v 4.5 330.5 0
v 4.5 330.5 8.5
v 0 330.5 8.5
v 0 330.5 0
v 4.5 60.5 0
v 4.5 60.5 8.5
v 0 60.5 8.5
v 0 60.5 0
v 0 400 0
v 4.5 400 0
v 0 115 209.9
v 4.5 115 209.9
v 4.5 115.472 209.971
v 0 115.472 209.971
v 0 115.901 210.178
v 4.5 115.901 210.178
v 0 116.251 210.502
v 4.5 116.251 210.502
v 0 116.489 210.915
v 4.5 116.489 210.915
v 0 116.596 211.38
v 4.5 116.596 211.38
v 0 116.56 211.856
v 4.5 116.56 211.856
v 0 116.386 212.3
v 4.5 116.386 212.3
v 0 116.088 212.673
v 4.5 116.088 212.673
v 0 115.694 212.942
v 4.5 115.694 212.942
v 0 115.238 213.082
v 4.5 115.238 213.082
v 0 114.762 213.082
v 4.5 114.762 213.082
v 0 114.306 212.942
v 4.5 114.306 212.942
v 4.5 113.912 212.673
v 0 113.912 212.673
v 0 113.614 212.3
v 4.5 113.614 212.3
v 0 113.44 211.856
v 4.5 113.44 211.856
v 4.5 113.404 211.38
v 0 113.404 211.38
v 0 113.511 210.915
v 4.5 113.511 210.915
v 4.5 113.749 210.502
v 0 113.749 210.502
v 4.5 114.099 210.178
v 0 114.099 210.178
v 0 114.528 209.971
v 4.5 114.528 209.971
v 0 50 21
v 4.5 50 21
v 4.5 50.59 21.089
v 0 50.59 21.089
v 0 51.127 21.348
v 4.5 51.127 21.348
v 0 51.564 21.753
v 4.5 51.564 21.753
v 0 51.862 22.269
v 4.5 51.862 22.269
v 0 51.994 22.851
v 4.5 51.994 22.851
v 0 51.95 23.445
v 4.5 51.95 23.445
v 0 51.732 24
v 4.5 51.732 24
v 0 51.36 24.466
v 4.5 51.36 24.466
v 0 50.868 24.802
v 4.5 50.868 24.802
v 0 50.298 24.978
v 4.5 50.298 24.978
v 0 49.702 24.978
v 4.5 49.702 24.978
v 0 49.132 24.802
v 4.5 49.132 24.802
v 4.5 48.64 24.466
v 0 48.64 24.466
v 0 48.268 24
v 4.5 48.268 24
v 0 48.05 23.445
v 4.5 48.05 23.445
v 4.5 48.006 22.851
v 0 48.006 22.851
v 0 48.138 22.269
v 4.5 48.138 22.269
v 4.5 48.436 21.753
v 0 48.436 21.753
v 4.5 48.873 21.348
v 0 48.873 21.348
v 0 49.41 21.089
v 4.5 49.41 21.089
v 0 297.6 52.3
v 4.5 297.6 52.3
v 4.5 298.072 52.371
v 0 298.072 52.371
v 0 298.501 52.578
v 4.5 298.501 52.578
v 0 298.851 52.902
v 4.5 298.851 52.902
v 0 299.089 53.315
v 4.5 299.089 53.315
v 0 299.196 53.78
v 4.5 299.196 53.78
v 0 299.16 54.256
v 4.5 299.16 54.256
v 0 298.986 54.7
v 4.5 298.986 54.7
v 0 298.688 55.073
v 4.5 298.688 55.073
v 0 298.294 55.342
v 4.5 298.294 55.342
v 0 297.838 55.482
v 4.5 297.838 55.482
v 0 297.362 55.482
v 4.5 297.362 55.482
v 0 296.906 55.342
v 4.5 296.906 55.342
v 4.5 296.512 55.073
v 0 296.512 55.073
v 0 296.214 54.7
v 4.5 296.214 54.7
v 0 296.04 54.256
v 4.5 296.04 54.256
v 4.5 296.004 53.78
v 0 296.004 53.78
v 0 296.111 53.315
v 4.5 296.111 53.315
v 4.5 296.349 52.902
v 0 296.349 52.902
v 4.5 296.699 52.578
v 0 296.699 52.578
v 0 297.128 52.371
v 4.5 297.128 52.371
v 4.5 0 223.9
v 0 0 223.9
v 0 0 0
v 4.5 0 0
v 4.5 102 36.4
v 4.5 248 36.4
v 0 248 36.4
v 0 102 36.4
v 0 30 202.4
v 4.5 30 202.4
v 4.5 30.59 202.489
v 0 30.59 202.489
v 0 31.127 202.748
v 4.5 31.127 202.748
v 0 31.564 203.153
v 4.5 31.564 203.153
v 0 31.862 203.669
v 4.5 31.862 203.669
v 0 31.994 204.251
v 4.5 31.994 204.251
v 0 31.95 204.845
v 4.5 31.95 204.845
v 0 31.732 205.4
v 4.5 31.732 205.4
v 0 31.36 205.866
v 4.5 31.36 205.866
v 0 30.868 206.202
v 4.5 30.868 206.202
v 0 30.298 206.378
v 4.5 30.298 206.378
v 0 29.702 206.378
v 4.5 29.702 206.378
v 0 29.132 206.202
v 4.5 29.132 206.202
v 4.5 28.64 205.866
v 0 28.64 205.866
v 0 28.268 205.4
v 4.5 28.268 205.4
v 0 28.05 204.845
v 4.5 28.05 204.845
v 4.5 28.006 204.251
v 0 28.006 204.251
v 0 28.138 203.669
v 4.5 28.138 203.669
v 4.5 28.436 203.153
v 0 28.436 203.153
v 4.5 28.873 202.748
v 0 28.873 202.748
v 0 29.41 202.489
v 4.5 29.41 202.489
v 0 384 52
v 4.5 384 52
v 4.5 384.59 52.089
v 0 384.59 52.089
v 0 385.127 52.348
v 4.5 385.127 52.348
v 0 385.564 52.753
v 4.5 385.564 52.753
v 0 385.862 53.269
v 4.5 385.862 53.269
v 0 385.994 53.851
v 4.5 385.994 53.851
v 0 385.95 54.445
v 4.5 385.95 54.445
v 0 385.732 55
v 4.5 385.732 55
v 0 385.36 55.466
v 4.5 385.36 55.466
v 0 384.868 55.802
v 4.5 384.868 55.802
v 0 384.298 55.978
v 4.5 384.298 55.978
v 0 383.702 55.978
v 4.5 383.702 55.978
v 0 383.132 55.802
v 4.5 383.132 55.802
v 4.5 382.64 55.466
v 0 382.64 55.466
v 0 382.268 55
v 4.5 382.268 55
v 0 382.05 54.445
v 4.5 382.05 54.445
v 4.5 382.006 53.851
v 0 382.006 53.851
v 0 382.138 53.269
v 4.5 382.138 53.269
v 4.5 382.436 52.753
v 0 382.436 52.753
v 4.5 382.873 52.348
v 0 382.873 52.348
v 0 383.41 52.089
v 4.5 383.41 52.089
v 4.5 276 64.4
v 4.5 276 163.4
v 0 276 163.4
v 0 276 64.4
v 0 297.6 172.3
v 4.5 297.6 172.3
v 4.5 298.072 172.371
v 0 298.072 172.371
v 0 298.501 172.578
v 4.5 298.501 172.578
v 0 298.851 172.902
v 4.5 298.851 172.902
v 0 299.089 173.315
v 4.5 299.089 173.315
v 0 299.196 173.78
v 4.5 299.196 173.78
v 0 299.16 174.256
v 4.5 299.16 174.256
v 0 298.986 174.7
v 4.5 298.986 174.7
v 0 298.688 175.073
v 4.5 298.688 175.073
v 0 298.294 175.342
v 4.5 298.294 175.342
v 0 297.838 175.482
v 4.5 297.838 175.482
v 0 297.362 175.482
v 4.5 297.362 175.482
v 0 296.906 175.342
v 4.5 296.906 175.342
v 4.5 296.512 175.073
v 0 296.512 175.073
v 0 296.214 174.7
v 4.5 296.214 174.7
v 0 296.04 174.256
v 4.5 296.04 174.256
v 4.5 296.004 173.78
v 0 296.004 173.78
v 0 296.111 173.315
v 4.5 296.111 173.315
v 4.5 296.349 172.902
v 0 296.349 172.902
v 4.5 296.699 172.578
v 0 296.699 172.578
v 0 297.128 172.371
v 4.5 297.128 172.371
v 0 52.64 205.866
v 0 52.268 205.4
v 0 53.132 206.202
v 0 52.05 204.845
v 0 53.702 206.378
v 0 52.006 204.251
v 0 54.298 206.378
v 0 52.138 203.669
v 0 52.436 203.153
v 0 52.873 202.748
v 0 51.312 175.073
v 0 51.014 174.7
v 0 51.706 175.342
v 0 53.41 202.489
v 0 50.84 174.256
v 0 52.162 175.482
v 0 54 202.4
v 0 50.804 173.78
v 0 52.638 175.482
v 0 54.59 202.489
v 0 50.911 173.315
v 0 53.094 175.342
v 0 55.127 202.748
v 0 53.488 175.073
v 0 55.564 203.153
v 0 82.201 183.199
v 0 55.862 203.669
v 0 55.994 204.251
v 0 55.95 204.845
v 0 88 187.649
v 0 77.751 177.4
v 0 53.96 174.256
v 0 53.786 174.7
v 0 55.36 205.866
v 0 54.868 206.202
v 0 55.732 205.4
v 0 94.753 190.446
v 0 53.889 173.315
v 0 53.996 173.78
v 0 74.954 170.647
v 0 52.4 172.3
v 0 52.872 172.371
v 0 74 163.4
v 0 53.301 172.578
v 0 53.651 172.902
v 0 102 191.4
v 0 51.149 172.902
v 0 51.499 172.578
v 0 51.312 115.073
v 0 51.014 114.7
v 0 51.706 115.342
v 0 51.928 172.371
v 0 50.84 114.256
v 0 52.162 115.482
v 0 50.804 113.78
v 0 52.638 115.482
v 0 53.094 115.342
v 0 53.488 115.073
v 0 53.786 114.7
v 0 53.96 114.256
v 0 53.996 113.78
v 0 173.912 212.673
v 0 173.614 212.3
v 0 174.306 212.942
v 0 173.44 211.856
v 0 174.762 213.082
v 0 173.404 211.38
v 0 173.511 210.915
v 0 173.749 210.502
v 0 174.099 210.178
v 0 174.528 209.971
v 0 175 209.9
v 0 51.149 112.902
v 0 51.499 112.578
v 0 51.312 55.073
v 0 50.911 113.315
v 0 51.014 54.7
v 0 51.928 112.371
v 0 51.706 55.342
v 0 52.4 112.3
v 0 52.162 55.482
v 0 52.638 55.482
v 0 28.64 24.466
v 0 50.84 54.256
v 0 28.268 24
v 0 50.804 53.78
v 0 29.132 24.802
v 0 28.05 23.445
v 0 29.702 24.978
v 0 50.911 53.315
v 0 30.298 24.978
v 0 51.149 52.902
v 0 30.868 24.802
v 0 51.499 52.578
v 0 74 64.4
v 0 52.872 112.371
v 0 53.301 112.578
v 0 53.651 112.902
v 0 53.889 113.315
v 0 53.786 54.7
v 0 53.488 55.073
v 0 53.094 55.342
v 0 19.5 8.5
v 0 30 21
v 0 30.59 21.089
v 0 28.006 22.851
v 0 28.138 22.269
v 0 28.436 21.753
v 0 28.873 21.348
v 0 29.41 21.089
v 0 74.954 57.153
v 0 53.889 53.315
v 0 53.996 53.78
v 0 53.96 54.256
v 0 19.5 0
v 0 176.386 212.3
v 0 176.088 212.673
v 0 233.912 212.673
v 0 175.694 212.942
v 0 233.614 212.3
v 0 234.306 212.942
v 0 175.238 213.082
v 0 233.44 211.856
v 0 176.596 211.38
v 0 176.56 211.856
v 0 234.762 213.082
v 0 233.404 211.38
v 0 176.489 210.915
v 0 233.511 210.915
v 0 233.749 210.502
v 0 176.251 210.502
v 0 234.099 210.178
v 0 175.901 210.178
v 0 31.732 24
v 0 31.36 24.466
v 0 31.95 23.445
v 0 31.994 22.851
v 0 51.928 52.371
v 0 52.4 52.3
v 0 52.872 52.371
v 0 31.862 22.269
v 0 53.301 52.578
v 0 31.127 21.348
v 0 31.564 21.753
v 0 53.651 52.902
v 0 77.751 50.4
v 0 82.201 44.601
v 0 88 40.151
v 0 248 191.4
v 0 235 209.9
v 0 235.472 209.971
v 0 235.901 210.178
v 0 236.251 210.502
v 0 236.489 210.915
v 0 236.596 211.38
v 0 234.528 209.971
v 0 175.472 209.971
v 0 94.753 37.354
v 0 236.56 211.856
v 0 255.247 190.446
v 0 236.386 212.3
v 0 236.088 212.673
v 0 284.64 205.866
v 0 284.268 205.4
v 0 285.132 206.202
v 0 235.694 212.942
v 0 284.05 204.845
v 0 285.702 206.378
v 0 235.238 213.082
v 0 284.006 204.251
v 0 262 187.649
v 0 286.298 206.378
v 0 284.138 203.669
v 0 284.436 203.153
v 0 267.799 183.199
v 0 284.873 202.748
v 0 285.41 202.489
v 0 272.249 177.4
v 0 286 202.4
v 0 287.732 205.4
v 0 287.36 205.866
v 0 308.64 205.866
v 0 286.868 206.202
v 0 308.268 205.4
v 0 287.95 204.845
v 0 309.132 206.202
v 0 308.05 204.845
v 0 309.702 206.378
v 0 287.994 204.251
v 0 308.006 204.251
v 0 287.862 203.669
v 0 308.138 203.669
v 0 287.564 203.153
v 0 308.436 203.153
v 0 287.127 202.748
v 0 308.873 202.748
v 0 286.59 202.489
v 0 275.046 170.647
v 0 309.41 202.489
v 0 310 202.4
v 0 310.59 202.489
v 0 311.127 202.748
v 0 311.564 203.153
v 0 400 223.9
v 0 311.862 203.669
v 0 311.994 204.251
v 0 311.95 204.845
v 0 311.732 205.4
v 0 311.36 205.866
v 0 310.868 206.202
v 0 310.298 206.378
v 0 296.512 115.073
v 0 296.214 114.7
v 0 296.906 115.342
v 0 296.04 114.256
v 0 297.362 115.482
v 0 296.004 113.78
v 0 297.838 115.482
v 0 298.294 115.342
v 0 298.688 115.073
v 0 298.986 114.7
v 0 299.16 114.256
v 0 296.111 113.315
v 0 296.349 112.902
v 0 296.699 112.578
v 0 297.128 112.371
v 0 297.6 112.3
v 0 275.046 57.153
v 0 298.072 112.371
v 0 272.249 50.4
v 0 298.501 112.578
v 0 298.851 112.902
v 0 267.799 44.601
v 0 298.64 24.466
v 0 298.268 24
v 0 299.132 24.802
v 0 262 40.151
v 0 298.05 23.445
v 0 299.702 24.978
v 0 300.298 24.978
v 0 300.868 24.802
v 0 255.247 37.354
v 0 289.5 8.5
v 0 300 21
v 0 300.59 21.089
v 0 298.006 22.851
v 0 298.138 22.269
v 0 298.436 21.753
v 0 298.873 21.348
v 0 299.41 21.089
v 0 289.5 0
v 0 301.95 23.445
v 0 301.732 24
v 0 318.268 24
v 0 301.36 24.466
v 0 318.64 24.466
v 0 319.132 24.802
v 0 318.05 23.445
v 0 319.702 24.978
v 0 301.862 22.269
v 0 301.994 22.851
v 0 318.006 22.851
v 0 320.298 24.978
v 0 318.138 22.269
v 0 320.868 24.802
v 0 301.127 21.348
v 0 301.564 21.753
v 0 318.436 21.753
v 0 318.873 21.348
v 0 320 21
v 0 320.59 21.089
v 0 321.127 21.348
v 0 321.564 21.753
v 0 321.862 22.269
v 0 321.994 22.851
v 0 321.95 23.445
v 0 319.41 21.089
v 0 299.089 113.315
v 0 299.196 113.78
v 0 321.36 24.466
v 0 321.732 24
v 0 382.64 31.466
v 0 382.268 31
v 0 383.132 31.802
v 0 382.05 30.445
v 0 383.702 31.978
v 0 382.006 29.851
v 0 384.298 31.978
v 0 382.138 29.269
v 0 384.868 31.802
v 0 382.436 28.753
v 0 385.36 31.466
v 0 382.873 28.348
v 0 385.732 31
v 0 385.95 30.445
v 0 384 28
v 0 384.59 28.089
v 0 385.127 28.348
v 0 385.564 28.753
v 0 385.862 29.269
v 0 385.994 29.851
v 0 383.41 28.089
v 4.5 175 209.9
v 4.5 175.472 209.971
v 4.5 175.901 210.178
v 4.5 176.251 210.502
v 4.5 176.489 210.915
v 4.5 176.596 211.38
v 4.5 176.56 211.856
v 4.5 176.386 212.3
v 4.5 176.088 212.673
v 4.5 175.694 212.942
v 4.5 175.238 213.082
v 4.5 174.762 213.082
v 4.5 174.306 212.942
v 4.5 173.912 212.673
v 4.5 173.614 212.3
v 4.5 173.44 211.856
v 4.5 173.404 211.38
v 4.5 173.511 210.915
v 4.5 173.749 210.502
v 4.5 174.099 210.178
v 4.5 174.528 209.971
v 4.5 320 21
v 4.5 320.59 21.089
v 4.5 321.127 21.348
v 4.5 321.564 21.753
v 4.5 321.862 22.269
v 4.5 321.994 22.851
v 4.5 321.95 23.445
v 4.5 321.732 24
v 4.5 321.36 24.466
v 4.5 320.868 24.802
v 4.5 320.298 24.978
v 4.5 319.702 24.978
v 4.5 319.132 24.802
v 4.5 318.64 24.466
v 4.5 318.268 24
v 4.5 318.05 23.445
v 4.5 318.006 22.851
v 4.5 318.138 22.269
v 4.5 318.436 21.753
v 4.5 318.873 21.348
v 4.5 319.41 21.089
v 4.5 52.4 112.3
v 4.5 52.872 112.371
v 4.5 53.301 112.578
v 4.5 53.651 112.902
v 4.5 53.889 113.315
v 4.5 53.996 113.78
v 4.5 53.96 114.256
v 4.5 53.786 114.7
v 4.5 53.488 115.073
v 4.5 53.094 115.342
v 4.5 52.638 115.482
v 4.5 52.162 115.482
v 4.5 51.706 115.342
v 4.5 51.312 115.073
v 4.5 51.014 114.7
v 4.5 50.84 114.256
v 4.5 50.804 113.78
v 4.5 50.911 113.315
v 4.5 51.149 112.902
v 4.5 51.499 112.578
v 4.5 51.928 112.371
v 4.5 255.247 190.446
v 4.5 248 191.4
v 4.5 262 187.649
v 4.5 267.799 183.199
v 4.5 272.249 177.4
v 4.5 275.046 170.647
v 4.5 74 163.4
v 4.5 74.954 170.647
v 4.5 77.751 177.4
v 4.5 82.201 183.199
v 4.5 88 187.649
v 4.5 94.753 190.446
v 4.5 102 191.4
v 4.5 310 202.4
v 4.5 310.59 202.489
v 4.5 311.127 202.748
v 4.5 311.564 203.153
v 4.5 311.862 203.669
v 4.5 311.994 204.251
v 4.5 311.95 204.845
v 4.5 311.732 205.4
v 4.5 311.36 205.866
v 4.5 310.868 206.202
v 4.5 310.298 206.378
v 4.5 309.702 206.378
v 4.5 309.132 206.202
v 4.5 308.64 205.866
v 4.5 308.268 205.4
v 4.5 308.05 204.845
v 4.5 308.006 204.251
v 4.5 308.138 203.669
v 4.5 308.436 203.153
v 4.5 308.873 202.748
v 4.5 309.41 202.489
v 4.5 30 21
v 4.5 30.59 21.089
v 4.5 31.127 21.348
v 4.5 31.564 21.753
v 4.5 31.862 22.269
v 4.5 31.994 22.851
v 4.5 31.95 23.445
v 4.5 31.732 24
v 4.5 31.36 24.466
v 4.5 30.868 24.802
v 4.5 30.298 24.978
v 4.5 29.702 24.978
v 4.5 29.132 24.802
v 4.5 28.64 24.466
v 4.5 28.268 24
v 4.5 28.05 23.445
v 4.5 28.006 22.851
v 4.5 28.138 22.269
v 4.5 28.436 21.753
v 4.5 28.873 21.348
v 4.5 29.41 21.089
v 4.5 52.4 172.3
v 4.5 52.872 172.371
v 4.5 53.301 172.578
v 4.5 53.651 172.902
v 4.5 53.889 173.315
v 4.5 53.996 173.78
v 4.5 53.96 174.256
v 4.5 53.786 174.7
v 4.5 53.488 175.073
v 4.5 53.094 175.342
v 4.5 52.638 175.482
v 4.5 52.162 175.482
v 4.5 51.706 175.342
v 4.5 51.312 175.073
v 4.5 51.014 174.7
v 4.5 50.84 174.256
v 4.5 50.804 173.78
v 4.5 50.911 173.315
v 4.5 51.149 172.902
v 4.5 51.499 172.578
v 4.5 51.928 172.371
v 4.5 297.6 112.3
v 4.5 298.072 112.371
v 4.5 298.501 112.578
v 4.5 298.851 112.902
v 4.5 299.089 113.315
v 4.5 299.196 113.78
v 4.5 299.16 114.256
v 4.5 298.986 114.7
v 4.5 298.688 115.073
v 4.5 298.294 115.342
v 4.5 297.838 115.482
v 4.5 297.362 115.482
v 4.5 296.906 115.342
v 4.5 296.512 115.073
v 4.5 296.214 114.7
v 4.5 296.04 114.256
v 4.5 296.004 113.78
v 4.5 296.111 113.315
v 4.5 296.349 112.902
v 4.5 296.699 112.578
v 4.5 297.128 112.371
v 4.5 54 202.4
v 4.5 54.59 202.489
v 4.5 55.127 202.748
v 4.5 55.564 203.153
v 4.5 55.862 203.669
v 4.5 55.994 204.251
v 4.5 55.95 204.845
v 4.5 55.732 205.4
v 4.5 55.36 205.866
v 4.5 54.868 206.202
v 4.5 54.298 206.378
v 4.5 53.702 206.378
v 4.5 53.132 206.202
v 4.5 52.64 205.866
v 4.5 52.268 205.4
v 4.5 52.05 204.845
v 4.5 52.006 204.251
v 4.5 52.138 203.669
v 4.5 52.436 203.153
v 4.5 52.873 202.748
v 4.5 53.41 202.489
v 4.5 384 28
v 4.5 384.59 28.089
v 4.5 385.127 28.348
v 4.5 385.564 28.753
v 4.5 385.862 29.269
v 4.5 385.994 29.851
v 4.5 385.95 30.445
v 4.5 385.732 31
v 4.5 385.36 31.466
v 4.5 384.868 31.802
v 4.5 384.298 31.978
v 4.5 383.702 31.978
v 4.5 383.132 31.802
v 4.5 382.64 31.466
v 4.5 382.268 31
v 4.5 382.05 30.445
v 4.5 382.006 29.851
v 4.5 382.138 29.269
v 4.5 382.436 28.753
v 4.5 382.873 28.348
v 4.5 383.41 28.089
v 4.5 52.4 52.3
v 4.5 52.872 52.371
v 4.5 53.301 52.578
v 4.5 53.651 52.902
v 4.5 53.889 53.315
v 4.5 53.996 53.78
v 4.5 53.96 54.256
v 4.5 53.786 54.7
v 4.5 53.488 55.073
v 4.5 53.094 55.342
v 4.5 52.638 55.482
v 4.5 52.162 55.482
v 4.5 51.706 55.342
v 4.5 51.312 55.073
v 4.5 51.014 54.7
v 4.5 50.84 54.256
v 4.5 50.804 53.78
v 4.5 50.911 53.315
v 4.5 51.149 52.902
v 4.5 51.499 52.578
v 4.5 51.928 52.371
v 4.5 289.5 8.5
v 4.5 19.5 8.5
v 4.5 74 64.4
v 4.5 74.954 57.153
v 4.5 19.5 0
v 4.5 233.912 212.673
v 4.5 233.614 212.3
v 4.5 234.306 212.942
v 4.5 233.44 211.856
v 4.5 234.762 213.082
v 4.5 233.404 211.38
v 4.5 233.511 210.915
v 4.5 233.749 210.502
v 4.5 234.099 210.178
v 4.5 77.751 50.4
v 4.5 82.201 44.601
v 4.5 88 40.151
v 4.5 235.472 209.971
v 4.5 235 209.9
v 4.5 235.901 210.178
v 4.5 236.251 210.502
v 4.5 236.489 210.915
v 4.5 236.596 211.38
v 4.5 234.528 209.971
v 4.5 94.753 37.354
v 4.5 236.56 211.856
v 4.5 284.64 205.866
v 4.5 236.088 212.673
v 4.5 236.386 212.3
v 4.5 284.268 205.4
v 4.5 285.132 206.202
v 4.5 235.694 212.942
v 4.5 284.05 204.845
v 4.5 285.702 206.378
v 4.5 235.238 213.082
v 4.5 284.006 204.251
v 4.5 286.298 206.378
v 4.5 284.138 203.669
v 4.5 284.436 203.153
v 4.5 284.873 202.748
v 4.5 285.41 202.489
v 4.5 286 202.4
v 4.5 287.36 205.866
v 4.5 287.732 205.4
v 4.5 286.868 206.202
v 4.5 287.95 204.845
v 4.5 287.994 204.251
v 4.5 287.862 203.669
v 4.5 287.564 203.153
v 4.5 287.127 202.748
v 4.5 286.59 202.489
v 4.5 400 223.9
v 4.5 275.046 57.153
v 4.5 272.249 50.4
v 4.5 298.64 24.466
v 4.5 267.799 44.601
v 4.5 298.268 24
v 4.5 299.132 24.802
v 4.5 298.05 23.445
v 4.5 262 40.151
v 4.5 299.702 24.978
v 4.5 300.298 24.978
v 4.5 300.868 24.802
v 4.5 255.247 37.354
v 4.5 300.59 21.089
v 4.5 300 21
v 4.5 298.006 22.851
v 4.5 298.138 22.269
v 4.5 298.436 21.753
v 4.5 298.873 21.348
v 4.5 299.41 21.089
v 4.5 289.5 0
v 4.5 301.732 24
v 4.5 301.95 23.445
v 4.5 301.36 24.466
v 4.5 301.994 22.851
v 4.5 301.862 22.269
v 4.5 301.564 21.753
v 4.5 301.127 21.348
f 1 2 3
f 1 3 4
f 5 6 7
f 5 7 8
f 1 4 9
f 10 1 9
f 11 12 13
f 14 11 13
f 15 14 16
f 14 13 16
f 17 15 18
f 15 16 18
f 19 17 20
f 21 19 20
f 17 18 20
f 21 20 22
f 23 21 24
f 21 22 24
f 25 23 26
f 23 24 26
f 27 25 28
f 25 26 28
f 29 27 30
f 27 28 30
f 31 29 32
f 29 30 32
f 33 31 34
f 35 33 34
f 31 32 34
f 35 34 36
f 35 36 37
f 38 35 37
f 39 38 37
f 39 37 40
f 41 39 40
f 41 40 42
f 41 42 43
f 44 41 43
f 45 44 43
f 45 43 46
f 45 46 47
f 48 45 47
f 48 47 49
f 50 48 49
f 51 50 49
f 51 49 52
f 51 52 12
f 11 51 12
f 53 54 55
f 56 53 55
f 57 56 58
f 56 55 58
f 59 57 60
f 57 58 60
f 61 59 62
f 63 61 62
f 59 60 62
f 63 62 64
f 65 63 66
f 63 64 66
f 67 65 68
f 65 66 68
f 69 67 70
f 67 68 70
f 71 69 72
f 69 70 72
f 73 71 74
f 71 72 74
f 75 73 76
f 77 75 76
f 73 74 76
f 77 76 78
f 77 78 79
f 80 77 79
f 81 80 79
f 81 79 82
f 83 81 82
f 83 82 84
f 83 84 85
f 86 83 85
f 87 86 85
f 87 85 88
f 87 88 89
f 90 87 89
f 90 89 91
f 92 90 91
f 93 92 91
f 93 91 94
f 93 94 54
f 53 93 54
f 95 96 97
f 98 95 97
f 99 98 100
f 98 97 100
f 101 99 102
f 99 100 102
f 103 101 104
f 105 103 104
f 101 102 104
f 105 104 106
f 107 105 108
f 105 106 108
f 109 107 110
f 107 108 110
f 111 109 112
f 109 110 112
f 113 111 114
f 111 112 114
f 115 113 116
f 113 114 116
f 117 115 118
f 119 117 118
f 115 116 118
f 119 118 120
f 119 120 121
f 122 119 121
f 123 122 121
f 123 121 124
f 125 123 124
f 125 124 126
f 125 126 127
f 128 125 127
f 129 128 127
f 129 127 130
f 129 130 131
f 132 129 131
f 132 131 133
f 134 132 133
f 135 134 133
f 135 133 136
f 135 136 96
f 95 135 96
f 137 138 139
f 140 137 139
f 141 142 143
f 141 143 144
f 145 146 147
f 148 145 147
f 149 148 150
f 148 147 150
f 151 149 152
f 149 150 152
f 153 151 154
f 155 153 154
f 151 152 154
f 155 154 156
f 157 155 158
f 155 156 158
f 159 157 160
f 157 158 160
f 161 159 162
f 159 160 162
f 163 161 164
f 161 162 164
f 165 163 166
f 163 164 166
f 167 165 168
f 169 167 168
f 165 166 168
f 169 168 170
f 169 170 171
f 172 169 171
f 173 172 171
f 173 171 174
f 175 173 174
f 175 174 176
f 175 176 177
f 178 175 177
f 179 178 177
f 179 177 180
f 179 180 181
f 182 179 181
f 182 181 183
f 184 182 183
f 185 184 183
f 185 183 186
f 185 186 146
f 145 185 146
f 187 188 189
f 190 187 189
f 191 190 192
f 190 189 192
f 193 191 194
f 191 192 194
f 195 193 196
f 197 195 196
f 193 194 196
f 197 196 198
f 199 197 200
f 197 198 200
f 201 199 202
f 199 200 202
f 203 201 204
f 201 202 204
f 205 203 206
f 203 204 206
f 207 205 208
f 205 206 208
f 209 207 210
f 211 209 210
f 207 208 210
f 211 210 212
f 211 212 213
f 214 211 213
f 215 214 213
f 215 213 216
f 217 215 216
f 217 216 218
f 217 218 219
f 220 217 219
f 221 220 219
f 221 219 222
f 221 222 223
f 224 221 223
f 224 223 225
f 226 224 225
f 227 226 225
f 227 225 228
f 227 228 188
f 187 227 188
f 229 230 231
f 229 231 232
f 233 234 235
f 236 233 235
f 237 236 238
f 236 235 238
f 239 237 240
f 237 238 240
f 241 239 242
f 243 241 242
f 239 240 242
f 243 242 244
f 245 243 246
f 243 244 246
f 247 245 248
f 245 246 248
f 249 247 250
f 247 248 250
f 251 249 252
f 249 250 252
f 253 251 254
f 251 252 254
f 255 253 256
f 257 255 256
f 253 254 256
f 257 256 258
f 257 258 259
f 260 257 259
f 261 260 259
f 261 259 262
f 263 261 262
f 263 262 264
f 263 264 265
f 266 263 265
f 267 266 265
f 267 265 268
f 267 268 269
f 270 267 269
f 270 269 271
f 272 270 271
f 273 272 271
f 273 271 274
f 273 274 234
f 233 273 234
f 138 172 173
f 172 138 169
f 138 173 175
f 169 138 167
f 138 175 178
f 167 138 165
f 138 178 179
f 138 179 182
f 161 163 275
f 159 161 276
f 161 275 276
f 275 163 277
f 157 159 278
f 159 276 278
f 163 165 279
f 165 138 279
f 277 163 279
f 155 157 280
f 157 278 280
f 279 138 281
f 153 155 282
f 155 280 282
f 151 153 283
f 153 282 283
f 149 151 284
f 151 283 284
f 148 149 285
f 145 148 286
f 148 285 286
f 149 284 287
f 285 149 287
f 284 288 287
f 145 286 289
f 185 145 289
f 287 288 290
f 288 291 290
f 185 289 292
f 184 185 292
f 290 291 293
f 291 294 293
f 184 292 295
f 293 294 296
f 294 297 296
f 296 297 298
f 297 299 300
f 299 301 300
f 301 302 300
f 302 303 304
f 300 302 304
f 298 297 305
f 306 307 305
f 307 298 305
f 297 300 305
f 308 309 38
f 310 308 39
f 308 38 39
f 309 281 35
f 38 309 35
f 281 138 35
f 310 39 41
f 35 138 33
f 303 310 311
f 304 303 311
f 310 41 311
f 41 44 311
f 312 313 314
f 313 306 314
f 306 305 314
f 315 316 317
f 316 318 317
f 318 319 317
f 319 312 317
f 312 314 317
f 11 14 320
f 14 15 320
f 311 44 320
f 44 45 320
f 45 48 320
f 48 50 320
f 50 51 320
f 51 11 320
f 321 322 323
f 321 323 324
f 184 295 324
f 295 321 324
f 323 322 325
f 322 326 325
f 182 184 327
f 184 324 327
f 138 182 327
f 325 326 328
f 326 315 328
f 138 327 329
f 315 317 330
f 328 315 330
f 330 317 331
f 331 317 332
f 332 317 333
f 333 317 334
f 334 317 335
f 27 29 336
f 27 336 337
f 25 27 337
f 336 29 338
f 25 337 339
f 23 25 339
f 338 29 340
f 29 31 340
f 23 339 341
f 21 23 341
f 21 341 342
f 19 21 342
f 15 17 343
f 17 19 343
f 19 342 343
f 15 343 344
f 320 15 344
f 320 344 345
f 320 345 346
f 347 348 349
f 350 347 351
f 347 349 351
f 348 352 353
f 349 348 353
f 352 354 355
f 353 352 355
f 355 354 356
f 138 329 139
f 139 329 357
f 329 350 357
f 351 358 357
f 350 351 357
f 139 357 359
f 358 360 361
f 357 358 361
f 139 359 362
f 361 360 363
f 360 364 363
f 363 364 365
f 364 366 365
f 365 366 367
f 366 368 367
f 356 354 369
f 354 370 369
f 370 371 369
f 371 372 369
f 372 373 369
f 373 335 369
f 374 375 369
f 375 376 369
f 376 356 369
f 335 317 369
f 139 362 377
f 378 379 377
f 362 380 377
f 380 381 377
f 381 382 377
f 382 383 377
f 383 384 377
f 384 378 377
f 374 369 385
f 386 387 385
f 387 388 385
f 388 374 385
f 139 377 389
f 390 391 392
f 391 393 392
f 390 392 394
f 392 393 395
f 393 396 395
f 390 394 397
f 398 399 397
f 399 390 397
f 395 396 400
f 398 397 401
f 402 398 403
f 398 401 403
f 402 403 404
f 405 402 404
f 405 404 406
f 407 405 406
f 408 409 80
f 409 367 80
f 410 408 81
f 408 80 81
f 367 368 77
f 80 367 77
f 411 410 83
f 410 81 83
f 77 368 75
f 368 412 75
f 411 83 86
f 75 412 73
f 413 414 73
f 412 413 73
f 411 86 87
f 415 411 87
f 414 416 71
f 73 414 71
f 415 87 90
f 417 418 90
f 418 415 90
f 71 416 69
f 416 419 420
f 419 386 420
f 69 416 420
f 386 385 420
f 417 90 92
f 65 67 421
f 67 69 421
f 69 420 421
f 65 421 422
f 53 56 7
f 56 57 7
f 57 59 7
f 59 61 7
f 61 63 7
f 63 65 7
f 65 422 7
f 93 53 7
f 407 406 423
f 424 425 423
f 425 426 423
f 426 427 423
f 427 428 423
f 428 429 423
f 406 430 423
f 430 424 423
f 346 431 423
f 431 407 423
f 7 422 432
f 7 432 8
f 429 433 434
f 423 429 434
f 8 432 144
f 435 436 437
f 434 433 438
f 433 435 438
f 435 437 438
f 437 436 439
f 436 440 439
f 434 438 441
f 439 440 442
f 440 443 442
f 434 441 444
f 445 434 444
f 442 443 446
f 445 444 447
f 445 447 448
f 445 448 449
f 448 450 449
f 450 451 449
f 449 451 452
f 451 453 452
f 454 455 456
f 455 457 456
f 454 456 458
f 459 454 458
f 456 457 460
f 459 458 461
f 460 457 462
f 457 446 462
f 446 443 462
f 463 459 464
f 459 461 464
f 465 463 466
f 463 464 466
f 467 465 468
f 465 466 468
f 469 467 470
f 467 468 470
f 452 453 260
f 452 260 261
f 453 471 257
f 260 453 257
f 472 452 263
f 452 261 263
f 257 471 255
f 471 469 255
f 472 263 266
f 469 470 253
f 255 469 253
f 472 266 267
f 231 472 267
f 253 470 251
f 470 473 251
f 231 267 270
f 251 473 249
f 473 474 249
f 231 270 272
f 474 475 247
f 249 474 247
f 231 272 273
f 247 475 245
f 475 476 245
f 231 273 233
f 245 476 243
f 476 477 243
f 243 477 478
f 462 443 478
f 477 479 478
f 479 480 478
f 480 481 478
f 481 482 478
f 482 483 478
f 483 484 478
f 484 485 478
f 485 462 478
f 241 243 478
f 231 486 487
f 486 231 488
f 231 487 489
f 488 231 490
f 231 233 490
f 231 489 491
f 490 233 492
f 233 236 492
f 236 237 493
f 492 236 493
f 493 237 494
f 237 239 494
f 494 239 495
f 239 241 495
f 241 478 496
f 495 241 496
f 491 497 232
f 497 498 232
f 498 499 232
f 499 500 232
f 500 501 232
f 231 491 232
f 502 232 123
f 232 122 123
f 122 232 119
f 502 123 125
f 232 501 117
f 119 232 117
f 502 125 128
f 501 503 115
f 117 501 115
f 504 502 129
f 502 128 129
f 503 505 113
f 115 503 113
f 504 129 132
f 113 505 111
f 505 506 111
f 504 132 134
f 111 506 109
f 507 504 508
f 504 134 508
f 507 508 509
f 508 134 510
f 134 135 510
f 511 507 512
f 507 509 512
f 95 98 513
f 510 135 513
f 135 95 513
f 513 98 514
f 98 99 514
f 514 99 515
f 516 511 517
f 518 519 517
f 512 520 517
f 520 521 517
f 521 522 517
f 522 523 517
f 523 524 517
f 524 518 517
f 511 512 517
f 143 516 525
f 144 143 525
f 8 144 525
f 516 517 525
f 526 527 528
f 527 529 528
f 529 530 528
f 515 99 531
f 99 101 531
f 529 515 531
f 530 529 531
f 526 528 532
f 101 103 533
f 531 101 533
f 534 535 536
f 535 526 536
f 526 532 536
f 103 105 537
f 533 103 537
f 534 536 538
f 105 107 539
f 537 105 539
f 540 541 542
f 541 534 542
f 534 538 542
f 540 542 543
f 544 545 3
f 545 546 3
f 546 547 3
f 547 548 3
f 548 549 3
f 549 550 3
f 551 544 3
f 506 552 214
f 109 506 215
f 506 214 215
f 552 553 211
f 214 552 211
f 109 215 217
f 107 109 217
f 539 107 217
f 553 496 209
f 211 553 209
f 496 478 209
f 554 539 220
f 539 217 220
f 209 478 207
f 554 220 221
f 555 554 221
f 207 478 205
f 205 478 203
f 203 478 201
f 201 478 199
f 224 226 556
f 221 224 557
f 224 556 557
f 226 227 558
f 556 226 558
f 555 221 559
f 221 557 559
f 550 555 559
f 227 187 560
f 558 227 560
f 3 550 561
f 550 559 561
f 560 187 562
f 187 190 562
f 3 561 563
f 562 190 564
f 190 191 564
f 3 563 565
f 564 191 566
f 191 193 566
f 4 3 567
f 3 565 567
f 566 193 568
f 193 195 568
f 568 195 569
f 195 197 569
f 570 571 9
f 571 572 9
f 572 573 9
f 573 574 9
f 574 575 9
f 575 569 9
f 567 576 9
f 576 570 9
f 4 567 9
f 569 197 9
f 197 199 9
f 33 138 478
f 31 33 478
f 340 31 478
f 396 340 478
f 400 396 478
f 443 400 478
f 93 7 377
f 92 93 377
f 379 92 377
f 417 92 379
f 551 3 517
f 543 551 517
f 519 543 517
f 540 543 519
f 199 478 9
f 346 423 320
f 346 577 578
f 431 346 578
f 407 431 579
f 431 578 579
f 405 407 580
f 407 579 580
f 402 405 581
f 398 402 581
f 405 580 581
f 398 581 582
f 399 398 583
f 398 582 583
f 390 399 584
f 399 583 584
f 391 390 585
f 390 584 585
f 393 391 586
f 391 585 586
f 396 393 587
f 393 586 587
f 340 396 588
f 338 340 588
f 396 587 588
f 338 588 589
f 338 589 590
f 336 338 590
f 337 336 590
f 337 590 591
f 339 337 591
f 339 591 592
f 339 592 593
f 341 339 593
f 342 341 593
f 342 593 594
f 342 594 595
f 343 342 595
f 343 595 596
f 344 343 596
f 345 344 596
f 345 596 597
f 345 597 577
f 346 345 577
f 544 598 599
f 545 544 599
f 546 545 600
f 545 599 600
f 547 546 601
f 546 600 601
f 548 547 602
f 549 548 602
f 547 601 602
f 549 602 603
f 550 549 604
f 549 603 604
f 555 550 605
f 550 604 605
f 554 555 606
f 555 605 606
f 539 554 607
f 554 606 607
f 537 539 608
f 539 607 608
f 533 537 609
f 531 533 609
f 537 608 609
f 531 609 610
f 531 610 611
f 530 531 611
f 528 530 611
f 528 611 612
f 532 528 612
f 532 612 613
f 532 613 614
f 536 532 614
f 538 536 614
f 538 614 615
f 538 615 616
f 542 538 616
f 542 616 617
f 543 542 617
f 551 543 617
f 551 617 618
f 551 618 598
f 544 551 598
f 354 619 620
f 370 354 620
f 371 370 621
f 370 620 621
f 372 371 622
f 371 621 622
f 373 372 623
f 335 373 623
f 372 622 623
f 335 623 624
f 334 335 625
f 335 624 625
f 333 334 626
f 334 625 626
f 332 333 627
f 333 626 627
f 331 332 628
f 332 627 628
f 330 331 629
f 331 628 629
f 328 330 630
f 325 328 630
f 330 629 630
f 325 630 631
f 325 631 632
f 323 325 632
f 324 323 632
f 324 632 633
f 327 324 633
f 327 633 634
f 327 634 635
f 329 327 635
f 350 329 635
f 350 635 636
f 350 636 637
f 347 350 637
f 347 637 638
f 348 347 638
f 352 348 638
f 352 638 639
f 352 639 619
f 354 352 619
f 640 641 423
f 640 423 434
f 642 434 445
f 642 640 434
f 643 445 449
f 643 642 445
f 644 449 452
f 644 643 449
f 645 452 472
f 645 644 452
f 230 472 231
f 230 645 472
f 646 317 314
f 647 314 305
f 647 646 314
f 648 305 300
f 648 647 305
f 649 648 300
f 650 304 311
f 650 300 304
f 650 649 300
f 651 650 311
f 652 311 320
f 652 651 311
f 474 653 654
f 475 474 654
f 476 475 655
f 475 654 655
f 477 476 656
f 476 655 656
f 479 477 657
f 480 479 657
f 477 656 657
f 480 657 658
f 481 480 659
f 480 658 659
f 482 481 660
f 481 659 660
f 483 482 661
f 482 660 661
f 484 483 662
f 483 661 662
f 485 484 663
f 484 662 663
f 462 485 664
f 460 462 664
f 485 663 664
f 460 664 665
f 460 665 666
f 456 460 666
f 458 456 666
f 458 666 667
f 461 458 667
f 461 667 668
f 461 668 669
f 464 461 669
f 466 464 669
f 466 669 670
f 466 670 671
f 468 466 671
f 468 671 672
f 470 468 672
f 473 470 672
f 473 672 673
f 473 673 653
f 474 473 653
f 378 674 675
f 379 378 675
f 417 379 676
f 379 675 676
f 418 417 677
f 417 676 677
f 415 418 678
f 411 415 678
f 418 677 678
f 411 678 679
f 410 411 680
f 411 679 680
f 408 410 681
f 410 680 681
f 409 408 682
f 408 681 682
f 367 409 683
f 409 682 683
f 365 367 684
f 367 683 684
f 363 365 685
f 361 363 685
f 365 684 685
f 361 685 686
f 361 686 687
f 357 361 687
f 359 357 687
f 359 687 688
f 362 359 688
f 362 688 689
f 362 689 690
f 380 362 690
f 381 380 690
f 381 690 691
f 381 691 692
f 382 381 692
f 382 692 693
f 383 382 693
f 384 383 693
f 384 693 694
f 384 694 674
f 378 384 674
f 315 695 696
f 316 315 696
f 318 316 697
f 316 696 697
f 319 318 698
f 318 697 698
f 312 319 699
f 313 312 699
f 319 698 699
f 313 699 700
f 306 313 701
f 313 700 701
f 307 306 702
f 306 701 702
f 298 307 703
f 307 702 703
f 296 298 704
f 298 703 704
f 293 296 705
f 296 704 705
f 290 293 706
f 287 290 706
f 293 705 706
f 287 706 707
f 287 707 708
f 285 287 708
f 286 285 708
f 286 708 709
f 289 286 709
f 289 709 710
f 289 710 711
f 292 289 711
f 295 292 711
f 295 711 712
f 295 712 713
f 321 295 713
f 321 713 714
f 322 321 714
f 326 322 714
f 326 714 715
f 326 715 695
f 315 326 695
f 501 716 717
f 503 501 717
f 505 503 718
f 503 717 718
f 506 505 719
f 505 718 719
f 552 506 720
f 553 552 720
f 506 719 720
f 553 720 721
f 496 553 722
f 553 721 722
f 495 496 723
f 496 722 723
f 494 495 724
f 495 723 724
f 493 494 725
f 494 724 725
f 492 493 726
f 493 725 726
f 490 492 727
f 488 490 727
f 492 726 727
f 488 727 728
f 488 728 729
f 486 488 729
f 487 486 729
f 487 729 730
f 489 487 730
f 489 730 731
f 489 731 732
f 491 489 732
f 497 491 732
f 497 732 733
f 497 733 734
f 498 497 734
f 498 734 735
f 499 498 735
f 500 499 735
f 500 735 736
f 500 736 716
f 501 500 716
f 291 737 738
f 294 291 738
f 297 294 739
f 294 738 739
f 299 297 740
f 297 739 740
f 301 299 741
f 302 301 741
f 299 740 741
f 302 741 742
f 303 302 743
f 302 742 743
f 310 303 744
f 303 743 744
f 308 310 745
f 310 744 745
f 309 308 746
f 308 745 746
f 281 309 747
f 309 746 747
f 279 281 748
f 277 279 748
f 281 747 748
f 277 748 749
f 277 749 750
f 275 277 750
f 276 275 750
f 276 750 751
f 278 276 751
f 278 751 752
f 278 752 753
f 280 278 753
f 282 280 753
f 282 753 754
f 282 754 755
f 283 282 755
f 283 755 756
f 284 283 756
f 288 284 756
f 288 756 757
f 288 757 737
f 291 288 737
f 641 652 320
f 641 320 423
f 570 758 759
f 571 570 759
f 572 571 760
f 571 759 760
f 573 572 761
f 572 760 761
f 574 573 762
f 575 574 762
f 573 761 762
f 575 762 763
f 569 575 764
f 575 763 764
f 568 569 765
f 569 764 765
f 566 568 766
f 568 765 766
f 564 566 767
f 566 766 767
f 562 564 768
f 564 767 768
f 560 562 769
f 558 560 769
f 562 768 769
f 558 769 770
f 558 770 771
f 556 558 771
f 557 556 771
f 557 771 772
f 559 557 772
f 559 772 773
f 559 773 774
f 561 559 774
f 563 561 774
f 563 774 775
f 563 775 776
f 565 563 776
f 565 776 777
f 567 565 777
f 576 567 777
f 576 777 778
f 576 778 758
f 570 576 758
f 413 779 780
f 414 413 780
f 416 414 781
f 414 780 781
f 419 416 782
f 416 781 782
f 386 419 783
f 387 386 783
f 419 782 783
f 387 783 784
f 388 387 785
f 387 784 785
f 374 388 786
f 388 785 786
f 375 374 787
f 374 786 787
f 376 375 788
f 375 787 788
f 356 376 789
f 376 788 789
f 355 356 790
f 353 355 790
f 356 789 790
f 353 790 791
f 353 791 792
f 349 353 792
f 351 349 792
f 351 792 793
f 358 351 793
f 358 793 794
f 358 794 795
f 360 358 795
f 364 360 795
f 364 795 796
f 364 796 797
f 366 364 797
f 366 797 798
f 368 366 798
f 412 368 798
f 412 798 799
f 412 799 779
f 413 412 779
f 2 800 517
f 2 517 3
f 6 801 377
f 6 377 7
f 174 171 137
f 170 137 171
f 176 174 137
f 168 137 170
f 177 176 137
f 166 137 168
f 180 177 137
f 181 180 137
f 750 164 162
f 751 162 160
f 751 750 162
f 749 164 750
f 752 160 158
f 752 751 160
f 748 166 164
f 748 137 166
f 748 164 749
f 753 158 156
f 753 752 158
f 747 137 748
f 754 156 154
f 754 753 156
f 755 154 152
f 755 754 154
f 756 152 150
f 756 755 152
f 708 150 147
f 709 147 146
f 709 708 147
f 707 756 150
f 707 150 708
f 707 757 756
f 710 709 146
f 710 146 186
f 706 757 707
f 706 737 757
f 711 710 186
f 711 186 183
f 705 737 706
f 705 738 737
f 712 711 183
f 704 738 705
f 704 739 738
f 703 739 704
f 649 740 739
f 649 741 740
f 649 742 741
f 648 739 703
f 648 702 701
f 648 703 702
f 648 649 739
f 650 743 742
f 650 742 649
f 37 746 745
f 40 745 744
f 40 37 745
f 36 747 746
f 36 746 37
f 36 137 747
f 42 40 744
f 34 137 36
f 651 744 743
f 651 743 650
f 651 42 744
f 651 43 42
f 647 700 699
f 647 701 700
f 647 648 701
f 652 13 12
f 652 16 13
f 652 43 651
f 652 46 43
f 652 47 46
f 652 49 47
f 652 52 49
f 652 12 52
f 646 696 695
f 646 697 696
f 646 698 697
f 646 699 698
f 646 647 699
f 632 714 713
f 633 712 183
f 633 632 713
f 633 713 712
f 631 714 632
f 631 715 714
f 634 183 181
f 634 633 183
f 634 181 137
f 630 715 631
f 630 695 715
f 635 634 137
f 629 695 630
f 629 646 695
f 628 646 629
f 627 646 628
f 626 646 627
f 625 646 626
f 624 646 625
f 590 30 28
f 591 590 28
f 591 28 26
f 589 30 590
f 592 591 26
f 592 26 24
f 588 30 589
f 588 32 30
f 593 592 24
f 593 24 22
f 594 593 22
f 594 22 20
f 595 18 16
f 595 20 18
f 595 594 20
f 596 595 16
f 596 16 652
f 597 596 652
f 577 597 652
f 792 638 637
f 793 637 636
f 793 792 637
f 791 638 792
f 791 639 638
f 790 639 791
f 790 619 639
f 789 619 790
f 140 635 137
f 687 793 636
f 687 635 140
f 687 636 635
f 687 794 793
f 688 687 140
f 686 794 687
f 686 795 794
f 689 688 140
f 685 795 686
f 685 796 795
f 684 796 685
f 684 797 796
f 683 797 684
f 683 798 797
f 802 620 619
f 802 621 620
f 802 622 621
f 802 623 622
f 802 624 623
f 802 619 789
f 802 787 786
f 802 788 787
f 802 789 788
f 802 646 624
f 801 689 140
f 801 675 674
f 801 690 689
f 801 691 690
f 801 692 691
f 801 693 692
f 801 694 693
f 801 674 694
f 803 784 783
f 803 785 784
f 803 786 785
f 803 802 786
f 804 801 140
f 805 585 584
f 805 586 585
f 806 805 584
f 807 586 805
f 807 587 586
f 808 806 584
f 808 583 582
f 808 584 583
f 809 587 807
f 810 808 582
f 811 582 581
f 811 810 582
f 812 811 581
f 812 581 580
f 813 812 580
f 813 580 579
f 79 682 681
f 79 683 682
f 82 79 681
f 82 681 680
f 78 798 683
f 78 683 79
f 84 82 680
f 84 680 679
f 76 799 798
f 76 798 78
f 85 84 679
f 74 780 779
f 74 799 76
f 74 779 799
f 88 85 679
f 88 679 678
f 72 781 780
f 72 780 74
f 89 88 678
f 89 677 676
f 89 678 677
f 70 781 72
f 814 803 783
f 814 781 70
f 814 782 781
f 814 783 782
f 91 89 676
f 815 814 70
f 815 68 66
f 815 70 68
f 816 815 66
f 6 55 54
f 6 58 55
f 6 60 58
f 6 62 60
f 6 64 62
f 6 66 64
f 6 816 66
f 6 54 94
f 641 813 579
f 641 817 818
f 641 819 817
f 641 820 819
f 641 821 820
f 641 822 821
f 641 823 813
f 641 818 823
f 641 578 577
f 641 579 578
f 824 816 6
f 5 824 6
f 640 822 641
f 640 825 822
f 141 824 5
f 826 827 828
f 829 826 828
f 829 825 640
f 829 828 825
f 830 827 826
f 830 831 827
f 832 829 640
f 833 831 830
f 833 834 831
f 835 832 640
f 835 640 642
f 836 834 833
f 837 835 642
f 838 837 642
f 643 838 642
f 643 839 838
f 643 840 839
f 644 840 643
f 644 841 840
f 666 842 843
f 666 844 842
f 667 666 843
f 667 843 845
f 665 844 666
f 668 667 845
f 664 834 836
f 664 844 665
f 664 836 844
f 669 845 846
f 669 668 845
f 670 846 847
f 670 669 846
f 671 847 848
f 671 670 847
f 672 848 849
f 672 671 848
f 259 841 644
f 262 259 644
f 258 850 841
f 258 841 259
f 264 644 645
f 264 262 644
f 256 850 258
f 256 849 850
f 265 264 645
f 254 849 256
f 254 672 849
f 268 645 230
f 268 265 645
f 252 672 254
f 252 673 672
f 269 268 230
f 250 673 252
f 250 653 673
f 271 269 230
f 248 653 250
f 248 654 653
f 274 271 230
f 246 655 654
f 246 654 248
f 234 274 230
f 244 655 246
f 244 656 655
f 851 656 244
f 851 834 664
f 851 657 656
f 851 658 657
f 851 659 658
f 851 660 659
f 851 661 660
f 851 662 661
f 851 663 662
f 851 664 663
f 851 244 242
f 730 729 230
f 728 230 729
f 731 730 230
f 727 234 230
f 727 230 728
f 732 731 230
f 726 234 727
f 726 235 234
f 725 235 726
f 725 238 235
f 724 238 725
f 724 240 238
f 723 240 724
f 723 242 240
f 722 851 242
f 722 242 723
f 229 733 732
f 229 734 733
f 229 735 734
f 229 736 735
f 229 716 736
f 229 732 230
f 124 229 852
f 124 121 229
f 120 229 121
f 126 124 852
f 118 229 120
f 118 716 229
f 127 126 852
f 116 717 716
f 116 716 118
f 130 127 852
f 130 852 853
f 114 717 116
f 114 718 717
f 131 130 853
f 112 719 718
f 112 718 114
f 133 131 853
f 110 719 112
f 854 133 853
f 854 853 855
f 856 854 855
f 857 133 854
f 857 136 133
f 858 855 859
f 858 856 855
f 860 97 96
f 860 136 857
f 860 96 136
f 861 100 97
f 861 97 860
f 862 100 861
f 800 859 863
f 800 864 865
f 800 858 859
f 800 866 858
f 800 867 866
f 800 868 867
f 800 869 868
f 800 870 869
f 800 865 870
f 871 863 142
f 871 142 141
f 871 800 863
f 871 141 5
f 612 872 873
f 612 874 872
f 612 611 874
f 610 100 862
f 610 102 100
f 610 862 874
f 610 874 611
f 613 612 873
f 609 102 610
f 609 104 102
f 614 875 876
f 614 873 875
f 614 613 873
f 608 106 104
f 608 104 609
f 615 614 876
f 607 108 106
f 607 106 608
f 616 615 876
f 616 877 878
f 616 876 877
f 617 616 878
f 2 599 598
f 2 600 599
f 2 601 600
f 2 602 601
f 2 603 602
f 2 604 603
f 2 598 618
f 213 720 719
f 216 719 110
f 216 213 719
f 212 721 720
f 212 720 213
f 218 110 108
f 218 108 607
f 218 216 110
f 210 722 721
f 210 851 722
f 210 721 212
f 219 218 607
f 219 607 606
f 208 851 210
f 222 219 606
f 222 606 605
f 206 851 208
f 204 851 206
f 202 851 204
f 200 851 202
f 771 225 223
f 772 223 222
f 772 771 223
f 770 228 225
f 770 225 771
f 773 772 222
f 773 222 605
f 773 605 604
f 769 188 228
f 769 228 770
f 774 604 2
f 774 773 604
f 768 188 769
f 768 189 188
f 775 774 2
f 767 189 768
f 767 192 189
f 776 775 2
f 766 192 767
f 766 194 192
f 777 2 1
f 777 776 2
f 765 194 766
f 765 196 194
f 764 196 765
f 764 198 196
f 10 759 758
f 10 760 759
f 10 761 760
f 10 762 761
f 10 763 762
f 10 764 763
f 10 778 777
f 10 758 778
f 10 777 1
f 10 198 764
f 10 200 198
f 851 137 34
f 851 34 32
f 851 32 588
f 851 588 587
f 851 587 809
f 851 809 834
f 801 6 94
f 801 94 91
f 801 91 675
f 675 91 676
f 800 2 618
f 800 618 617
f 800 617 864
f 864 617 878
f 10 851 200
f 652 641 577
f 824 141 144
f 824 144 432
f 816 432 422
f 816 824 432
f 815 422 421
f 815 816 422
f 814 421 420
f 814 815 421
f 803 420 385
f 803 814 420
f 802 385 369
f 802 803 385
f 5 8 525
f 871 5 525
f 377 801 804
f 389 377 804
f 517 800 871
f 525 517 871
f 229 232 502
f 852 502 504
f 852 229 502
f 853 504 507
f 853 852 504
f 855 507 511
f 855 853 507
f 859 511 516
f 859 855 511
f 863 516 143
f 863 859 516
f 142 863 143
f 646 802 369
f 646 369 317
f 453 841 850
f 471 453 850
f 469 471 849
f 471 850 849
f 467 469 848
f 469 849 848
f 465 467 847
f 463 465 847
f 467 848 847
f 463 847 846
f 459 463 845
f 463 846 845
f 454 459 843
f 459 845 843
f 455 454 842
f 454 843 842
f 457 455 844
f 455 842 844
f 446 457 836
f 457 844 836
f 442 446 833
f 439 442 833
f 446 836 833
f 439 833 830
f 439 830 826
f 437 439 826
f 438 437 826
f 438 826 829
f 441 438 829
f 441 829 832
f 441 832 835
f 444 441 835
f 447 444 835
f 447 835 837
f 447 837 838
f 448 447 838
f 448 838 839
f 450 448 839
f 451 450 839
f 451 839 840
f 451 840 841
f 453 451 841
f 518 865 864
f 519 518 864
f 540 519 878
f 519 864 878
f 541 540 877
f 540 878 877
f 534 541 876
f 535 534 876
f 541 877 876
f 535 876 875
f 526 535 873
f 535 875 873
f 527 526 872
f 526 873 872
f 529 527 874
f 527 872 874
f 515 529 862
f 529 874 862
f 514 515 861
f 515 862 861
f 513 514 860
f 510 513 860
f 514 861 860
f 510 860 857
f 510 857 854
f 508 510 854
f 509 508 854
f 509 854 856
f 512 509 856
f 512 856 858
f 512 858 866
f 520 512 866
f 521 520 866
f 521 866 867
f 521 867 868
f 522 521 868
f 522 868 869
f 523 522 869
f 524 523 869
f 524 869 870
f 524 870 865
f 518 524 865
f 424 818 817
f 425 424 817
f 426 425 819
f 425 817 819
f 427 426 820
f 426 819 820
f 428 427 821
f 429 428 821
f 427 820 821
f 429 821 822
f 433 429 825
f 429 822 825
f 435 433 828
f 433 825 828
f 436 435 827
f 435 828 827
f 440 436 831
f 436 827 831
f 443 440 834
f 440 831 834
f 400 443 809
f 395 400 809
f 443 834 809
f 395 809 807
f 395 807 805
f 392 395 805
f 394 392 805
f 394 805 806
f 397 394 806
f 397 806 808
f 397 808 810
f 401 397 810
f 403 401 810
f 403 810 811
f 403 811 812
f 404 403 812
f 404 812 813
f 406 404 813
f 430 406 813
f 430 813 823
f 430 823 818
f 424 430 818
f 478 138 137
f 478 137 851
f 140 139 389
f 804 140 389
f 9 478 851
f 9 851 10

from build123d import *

# Parameters (mm, degrees)
SKETCH_1_W          = 223.9
SKETCH_1_H          = 400
EXTRUDE_1_DEPTH     = 4.5
SKETCH_2_R          = 2
SKETCH_2_W          = 8.5
SKETCH_2_H          = 41
CUT_EXTRUDE_1_DEPTH = 10
CUT_EXTRUDE_2_REACH = 460.423
SKETCH_3_R          = 1.6


with BuildPart() as part:
    # 草图1 → 凸台-拉伸1 (new body)
    with BuildSketch(Plane(origin=(0, 0, 0), x_dir=(0, 0, -1), z_dir=(1, 0, 0))):
        with Locations((-111.95, 200)):
            Rectangle(SKETCH_1_W, SKETCH_1_H)
    extrude(amount=EXTRUDE_1_DEPTH)

    # 草图2 → 切除-拉伸1 (cut)
    with BuildSketch(Plane(origin=(4.5, 0, 0), x_dir=(0, 0, -1), z_dir=(1, 0, 0))):
        with Locations((-204.4, 310)):
            Circle(SKETCH_2_R)
        with Locations((-204.4, 286)):
            Circle(SKETCH_2_R)
        with Locations((-204.4, 54)):
            Circle(SKETCH_2_R)
        with Locations((-204.4, 30)):
            Circle(SKETCH_2_R)
        with Locations((-54, 384)):
            Circle(SKETCH_2_R)
        with Locations((-30, 384)):
            Circle(SKETCH_2_R)
        with Locations((-23, 320)):
            Circle(SKETCH_2_R)
        with Locations((-23, 300)):
            Circle(SKETCH_2_R)
        with Locations((-23, 50)):
            Circle(SKETCH_2_R)
        with Locations((-23, 30)):
            Circle(SKETCH_2_R)
        with Locations((-4.25, 310)):
            Rectangle(SKETCH_2_W, SKETCH_2_H)
        with Locations((-4.25, 40)):
            Rectangle(SKETCH_2_W, SKETCH_2_H)
    extrude(amount=-CUT_EXTRUDE_1_DEPTH, mode=Mode.SUBTRACT)

    # 草图3 → 切除-拉伸2 (cut, up to next)
    with BuildSketch(Plane(origin=(4.5, 0, 0), x_dir=(0, 0, -1), z_dir=(1, 0, 0)), mode=Mode.PRIVATE) as cut_extrude_2_sk1:
        with Locations((-211.5, 175)):
            Circle(SKETCH_3_R)
    cut_extrude_2_tool1 = extrude(cut_extrude_2_sk1.sketch, amount=-CUT_EXTRUDE_2_REACH, mode=Mode.PRIVATE) & part.part
    # 草图3 → 切除-拉伸2 (cut, up to next)
    with BuildSketch(Plane(origin=(4.5, 0, 0), x_dir=(0, 0, -1), z_dir=(1, 0, 0)), mode=Mode.PRIVATE) as cut_extrude_2_sk2:
        with Locations((-211.5, 235)):
            Circle(SKETCH_3_R)
    cut_extrude_2_tool2 = extrude(cut_extrude_2_sk2.sketch, amount=-CUT_EXTRUDE_2_REACH, mode=Mode.PRIVATE) & part.part
    # 草图3 → 切除-拉伸2 (cut, up to next)
    with BuildSketch(Plane(origin=(4.5, 0, 0), x_dir=(0, 0, -1), z_dir=(1, 0, 0)), mode=Mode.PRIVATE) as cut_extrude_2_sk3:
        with Locations((-211.5, 115)):
            Circle(SKETCH_3_R)
    cut_extrude_2_tool3 = extrude(cut_extrude_2_sk3.sketch, amount=-CUT_EXTRUDE_2_REACH, mode=Mode.PRIVATE) & part.part
    # 草图3 → 切除-拉伸2 (cut, up to next)
    with BuildSketch(Plane(origin=(4.5, 0, 0), x_dir=(0, 0, -1), z_dir=(1, 0, 0)), mode=Mode.PRIVATE) as cut_extrude_2_sk4:
        with Locations((-173.9, 297.6)):
            Circle(SKETCH_3_R)
    cut_extrude_2_tool4 = extrude(cut_extrude_2_sk4.sketch, amount=-CUT_EXTRUDE_2_REACH, mode=Mode.PRIVATE) & part.part
    # 草图3 → 切除-拉伸2 (cut, up to next)
    with BuildSketch(Plane(origin=(4.5, 0, 0), x_dir=(0, 0, -1), z_dir=(1, 0, 0)), mode=Mode.PRIVATE) as cut_extrude_2_sk5:
        with Locations((-53.9, 297.6)):
            Circle(SKETCH_3_R)
    cut_extrude_2_tool5 = extrude(cut_extrude_2_sk5.sketch, amount=-CUT_EXTRUDE_2_REACH, mode=Mode.PRIVATE) & part.part
    # 草图3 → 切除-拉伸2 (cut, up to next)
    with BuildSketch(Plane(origin=(4.5, 0, 0), x_dir=(0, 0, -1), z_dir=(1, 0, 0)), mode=Mode.PRIVATE) as cut_extrude_2_sk6:
        with Locations((-53.9, 52.4)):
            Circle(SKETCH_3_R)
    cut_extrude_2_tool6 = extrude(cut_extrude_2_sk6.sketch, amount=-CUT_EXTRUDE_2_REACH, mode=Mode.PRIVATE) & part.part
    # 草图3 → 切除-拉伸2 (cut, up to next)
    with BuildSketch(Plane(origin=(4.5, 0, 0), x_dir=(0, 0, -1), z_dir=(1, 0, 0)), mode=Mode.PRIVATE) as cut_extrude_2_sk7:
        with Locations((-173.9, 52.4)):
            Circle(SKETCH_3_R)
    cut_extrude_2_tool7 = extrude(cut_extrude_2_sk7.sketch, amount=-CUT_EXTRUDE_2_REACH, mode=Mode.PRIVATE) & part.part
    # 草图3 → 切除-拉伸2 (cut, up to next)
    with BuildSketch(Plane(origin=(4.5, 0, 0), x_dir=(0, 0, -1), z_dir=(1, 0, 0)), mode=Mode.PRIVATE) as cut_extrude_2_sk8:
        with Locations((-113.9, 297.6)):
            Circle(SKETCH_3_R)
    cut_extrude_2_tool8 = extrude(cut_extrude_2_sk8.sketch, amount=-CUT_EXTRUDE_2_REACH, mode=Mode.PRIVATE) & part.part
    # 草图3 → 切除-拉伸2 (cut, up to next)
    with BuildSketch(Plane(origin=(4.5, 0, 0), x_dir=(0, 0, -1), z_dir=(1, 0, 0)), mode=Mode.PRIVATE) as cut_extrude_2_sk9:
        with Locations((-113.9, 52.4)):
            Circle(SKETCH_3_R)
    cut_extrude_2_tool9 = extrude(cut_extrude_2_sk9.sketch, amount=-CUT_EXTRUDE_2_REACH, mode=Mode.PRIVATE) & part.part
    # 草图3 → 切除-拉伸2 (cut, up to next)
    with BuildSketch(Plane(origin=(4.5, 0, 0), x_dir=(0, 0, -1), z_dir=(1, 0, 0)), mode=Mode.PRIVATE) as cut_extrude_2_sk10:
        with BuildLine():
            Line((-64.4, 74), (-163.4, 74))
            ThreePointArc((-163.4, 74), (-183.198989873, 82.201010127), (-191.4, 102))
            Line((-191.4, 102), (-191.4, 248))
            ThreePointArc((-191.4, 248), (-183.198989873, 267.798989873), (-163.4, 276))
            Line((-163.4, 276), (-64.4, 276))
            ThreePointArc((-64.4, 276), (-44.601010127, 267.798989873), (-36.4, 248))
            Line((-36.4, 248), (-36.4, 102))
            ThreePointArc((-36.4, 102), (-44.601010127, 82.201010127), (-64.4, 74))
        make_face()
    cut_extrude_2_tool10 = extrude(cut_extrude_2_sk10.sketch, amount=-CUT_EXTRUDE_2_REACH, mode=Mode.PRIVATE) & part.part
    add(cut_extrude_2_tool1.solids().sort_by_distance((4.5, 175, 211.5))[0], mode=Mode.SUBTRACT)
    add(cut_extrude_2_tool2.solids().sort_by_distance((4.5, 235, 211.5))[0], mode=Mode.SUBTRACT)
    add(cut_extrude_2_tool3.solids().sort_by_distance((4.5, 115, 211.5))[0], mode=Mode.SUBTRACT)
    add(cut_extrude_2_tool4.solids().sort_by_distance((4.5, 297.6, 173.9))[0], mode=Mode.SUBTRACT)
    add(cut_extrude_2_tool5.solids().sort_by_distance((4.5, 297.6, 53.9))[0], mode=Mode.SUBTRACT)
    add(cut_extrude_2_tool6.solids().sort_by_distance((4.5, 52.4, 53.9))[0], mode=Mode.SUBTRACT)
    add(cut_extrude_2_tool7.solids().sort_by_distance((4.5, 52.4, 173.9))[0], mode=Mode.SUBTRACT)
    add(cut_extrude_2_tool8.solids().sort_by_distance((4.5, 297.6, 113.9))[0], mode=Mode.SUBTRACT)
    add(cut_extrude_2_tool9.solids().sort_by_distance((4.5, 52.4, 113.9))[0], mode=Mode.SUBTRACT)
    add(cut_extrude_2_tool10.solids().sort_by_distance((4.5, 175, 113.9))[0], mode=Mode.SUBTRACT)


solid = part.part
